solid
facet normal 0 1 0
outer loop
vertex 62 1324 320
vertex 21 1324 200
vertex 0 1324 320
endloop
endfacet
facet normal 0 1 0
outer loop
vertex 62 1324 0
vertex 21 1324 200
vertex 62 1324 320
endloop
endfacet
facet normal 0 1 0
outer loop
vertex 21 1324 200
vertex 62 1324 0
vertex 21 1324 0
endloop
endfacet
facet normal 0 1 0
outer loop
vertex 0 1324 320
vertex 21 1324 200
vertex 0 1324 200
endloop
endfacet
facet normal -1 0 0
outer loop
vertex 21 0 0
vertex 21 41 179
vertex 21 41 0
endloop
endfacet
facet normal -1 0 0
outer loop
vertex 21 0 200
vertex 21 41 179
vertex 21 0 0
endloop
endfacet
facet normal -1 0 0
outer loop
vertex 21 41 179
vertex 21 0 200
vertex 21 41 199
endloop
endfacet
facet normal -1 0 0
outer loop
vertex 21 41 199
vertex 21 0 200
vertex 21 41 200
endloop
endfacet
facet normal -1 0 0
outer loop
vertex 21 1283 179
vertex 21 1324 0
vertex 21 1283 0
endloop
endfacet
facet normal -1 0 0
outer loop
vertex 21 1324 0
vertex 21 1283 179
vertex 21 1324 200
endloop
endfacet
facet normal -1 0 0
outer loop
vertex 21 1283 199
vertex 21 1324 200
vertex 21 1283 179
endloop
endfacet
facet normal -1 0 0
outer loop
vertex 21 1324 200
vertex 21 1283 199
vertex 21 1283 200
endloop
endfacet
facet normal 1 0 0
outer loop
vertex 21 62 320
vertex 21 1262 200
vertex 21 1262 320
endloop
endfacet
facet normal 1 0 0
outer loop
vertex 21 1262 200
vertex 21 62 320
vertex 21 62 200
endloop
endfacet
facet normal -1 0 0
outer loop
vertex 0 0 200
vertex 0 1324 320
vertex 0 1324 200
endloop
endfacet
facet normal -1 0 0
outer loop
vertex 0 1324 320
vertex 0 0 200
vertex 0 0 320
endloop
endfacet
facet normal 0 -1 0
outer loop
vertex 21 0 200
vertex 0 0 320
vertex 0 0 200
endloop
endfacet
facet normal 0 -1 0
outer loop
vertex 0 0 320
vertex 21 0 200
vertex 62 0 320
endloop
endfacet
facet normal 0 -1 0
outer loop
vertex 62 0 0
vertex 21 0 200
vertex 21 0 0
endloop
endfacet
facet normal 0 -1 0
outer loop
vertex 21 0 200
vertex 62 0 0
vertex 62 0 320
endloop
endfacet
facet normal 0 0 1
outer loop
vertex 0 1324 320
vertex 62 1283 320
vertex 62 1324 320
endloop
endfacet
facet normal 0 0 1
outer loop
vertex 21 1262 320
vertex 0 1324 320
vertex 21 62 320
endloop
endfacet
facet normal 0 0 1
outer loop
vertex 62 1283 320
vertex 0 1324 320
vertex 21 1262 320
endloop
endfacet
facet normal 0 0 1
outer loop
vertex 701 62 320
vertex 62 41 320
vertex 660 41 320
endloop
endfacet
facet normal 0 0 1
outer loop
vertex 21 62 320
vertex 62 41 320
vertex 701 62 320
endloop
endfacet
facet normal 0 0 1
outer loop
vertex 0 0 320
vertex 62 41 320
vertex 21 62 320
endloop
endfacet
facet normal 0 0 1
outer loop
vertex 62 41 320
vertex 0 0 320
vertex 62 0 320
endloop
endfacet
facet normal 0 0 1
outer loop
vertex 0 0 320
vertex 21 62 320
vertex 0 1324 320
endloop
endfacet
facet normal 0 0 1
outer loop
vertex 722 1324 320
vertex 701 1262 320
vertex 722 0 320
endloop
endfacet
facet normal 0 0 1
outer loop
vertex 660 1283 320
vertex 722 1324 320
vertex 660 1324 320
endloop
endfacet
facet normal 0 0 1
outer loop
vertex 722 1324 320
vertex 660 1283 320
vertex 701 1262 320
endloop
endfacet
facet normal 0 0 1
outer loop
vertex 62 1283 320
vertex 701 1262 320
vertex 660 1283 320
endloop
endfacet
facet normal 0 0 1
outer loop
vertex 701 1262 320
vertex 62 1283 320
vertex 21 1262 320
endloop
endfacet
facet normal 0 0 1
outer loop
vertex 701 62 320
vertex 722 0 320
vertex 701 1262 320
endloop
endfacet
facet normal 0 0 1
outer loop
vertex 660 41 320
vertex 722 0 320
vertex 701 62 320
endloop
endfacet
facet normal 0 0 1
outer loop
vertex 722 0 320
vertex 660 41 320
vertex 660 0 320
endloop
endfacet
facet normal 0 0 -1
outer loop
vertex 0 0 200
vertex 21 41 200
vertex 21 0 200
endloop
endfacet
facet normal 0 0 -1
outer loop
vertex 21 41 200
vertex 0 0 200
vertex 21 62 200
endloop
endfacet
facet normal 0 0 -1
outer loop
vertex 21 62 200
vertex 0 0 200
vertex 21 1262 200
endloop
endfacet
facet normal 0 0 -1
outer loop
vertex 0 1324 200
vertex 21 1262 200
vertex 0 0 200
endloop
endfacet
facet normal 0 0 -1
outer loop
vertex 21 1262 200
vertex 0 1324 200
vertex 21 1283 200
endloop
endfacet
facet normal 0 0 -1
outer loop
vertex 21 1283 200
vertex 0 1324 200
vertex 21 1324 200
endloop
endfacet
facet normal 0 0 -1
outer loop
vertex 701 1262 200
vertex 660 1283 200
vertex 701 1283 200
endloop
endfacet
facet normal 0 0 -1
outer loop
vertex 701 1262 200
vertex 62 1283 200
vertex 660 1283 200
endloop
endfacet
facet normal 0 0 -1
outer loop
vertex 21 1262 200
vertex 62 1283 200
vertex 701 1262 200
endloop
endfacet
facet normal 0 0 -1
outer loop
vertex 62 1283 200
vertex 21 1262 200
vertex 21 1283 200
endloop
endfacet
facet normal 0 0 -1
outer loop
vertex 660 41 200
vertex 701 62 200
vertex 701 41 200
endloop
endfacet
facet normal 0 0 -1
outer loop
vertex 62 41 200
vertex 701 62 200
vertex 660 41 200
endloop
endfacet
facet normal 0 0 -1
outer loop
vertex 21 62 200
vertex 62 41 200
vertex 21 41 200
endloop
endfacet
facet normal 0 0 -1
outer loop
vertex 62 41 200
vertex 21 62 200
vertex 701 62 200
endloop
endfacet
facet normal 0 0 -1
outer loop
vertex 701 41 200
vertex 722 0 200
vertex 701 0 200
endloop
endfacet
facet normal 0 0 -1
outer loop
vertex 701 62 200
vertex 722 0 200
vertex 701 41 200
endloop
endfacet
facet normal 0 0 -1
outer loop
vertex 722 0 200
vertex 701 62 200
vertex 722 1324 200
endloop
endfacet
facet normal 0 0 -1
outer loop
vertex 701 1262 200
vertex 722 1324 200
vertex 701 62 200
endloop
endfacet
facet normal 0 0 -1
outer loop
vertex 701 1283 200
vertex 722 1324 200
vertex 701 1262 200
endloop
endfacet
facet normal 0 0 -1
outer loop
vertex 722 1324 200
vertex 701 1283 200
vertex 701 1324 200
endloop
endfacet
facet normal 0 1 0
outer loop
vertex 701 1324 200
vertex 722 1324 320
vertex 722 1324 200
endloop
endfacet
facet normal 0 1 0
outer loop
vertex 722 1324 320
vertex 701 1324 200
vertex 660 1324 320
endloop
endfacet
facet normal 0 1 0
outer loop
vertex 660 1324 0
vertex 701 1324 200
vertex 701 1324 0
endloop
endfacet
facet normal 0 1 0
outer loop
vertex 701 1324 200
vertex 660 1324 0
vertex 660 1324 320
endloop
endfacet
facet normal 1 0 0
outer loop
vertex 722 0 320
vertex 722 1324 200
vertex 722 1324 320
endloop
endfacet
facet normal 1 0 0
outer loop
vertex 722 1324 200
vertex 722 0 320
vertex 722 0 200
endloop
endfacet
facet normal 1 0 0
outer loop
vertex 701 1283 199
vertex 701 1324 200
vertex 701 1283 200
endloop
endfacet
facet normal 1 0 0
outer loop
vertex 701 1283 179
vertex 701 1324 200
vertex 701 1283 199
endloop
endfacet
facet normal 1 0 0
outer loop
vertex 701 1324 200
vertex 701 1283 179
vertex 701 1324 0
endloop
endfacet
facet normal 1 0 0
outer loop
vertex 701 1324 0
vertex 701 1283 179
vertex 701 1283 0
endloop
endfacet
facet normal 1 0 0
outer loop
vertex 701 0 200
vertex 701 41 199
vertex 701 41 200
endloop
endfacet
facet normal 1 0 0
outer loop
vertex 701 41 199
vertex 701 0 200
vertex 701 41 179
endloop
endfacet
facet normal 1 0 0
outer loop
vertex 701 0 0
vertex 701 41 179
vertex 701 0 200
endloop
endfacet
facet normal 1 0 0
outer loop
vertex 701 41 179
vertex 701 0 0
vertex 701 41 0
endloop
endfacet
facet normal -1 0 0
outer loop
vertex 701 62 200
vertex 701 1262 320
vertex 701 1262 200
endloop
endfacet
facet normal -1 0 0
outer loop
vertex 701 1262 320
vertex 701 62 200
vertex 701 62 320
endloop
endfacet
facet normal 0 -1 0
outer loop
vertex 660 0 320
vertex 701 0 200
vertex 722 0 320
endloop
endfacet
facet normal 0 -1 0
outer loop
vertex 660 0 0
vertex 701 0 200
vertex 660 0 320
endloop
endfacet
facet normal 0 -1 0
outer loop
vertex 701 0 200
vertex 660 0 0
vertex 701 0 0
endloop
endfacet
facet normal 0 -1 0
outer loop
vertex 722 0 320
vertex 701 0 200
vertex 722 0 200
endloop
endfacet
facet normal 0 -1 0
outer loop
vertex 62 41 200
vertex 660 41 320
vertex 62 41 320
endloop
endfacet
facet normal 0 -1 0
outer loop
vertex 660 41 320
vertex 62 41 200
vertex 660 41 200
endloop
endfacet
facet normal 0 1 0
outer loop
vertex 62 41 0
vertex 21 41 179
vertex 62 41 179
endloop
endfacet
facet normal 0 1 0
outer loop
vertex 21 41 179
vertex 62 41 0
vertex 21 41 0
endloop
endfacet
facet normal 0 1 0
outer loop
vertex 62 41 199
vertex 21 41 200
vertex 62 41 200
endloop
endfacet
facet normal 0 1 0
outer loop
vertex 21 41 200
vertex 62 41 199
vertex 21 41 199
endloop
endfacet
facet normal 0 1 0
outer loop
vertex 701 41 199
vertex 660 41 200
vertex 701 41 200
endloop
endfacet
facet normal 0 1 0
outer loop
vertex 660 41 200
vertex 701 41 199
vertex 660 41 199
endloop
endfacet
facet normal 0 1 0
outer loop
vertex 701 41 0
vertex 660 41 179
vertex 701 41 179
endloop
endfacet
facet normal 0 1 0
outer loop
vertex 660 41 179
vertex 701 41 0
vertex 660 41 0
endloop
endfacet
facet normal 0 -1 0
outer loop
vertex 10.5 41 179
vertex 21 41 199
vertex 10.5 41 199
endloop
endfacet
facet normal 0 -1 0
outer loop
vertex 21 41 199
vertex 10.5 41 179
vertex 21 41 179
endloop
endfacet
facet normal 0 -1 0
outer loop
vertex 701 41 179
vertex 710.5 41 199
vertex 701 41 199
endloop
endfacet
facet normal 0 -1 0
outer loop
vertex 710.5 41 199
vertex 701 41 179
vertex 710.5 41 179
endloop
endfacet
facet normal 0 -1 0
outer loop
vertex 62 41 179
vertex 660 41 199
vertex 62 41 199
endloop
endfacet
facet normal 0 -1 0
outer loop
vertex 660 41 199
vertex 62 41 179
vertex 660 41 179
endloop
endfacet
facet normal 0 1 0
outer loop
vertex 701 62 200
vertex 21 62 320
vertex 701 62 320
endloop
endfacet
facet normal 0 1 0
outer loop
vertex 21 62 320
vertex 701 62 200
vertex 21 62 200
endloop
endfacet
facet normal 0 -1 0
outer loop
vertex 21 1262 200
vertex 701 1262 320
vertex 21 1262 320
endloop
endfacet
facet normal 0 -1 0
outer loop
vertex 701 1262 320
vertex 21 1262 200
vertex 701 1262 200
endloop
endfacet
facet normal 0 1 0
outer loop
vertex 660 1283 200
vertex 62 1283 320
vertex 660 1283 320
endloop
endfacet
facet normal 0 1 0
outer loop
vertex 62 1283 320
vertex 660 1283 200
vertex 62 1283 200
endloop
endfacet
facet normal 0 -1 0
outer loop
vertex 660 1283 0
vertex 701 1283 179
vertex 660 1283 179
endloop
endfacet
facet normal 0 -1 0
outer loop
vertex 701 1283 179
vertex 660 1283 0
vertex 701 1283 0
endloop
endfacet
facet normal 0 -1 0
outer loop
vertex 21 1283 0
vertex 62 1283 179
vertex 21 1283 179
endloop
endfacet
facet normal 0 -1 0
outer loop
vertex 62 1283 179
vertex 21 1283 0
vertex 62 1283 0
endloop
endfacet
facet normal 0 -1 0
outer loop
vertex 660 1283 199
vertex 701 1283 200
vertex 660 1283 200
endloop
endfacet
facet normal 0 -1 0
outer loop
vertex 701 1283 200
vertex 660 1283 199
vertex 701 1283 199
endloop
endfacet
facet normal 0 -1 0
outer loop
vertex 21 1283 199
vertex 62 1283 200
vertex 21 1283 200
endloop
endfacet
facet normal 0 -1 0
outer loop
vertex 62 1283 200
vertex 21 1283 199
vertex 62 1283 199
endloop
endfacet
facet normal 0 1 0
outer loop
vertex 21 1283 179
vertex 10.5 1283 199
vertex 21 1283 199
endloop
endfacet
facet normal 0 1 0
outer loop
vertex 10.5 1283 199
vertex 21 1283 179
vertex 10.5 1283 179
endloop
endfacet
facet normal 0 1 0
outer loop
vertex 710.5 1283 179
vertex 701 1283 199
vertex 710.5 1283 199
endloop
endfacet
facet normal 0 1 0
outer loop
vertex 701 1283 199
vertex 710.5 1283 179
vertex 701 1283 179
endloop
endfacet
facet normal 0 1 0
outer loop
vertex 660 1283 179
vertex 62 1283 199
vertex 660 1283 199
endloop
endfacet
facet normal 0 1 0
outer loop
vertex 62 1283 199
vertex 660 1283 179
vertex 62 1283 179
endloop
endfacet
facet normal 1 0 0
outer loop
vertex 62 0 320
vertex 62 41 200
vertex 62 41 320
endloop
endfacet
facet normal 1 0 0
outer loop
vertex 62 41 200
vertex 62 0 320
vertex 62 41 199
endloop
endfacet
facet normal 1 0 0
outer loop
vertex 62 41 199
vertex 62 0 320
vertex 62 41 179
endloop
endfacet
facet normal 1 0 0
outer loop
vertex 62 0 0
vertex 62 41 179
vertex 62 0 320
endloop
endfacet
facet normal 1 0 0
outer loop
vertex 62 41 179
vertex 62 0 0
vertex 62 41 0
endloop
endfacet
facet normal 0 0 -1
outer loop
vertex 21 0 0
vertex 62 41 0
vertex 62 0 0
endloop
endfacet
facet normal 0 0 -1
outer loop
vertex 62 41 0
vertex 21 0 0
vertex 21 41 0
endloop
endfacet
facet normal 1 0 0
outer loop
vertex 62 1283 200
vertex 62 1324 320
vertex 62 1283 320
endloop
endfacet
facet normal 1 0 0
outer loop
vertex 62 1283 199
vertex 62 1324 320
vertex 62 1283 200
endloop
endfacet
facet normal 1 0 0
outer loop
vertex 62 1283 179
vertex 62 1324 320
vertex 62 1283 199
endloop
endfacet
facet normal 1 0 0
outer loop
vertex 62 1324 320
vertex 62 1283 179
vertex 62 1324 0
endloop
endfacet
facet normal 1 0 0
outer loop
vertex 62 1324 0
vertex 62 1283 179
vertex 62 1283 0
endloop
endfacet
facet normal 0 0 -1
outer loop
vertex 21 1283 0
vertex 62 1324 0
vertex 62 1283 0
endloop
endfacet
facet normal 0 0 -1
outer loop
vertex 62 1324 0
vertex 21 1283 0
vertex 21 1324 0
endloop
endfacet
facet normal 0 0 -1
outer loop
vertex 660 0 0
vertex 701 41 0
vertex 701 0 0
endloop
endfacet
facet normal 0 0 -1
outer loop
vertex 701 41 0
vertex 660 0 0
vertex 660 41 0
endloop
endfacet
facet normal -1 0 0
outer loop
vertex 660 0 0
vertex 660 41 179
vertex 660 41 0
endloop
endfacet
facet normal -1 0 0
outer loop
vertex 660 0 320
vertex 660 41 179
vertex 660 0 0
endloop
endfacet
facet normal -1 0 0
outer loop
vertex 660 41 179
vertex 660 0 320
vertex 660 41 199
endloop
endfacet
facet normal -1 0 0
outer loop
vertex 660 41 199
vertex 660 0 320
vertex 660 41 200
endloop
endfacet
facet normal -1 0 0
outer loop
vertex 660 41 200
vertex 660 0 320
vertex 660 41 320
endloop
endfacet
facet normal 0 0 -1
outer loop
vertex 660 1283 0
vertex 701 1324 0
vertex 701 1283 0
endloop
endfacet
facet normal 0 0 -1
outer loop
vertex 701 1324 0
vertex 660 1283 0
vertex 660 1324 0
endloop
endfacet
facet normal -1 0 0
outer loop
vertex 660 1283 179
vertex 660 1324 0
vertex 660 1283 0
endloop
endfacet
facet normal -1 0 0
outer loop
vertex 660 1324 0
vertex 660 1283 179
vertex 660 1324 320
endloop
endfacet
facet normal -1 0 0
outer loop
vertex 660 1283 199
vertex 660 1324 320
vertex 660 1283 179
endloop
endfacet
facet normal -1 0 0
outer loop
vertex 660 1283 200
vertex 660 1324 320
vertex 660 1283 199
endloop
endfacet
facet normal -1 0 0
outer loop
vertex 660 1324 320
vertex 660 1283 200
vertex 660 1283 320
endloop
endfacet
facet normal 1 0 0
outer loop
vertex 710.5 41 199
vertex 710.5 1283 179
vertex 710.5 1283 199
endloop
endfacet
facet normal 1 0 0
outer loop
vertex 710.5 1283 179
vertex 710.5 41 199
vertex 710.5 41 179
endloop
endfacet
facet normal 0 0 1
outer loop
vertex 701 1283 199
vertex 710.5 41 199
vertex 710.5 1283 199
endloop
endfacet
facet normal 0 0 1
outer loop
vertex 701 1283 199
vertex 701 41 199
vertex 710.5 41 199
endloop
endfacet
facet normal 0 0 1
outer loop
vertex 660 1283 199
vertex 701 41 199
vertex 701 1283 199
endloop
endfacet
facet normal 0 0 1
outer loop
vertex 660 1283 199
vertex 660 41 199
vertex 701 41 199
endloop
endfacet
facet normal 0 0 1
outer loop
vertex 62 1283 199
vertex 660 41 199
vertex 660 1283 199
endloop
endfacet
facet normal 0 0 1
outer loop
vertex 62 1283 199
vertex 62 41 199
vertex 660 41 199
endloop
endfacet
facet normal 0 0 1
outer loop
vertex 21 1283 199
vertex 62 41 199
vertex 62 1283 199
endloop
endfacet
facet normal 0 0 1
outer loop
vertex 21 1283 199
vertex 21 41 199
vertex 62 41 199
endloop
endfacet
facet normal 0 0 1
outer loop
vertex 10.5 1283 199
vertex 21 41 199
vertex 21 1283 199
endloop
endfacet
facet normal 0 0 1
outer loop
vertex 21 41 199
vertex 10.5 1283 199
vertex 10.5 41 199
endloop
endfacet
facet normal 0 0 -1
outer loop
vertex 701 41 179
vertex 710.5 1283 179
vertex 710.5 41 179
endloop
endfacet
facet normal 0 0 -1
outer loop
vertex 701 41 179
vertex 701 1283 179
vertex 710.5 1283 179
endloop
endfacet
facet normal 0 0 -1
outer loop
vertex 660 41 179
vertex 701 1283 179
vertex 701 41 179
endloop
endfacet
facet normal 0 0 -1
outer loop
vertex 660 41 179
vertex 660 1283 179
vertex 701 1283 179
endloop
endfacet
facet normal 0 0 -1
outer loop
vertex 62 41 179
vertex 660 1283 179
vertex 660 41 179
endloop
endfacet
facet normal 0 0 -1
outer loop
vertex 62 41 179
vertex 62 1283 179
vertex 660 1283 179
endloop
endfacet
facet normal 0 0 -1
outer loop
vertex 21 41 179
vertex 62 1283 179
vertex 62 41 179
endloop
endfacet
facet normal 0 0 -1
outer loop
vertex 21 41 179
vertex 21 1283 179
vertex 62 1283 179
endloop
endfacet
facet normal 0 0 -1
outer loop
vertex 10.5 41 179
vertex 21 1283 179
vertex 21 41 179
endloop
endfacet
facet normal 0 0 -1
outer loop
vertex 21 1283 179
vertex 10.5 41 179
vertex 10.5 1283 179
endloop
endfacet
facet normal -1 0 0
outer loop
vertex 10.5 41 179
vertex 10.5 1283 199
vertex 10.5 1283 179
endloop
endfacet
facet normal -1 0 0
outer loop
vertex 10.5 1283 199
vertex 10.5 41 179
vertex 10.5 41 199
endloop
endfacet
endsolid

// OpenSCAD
leg_height=320;
leg_width=41;
playfield_width=680;
playfield_height=1200;
sidewall_height=120;
sidewall_thikness=21;


//Sidewall long 1
translate([0,0,leg_height - sidewall_height]){
    rotate([90,0,90])
    cube([playfield_height + 2*leg_width + 2*sidewall_thikness,sidewall_height, sidewall_thikness],false);
}
//Sidewall long 2
translate([playfield_width+sidewall_thikness,0,leg_height - sidewall_height]){
    rotate([90,0,90])
    cube([playfield_height + 2*leg_width + 2*sidewall_thikness,sidewall_height, sidewall_thikness],false);
}
//Sidewall short 1
translate([sidewall_thikness,leg_width + sidewall_thikness,leg_height - sidewall_height]){
    rotate([90,0,0])
    cube([playfield_width, sidewall_height, sidewall_thikness],false);
}
//Sidewall short 2
translate([sidewall_thikness,playfield_height+leg_width + 2*sidewall_thikness,leg_height - sidewall_height]){
    rotate([90,0,0])
    cube([playfield_width, sidewall_height, sidewall_thikness],false);
}

//Leg 1
translate([sidewall_thikness,0]){
    cube([leg_width,leg_width,leg_height],false);
}
//Leg 2
translate([sidewall_thikness,playfield_height + leg_width + 2*sidewall_thikness]){
    cube([leg_width,leg_width,leg_height],false);
}
//Leg 3
translate([playfield_width - leg_width+sidewall_thikness,0]){
    cube([leg_width,leg_width,leg_height],false);
}
//Leg 4
translate([playfield_width - leg_width+sidewall_thikness,playfield_height + leg_width + 2*sidewall_thikness]){
    cube([leg_width,leg_width,leg_height],false);
}
//Bottom
translate([sidewall_thikness/2,leg_width,leg_height - sidewall_thikness - sidewall_height]){
    color([1,0,0])
    cube([700, playfield_height+2*sidewall_thikness,20],false);
}



//Leg
//translate([-playfield_width/2+leg_timber_width/2,-table_depth/2+leg_timber_width/2,0])
//{
//    leg(leg_length,lap_depth,leg_timber_width,strut_timber_width);
//}

//Leg
//translate([playfield_width/2-leg_timber_width/2,-table_depth/2+leg_timber_width/2,0]){
//    rotate([0,0,90]){
//        leg(leg_length,lap_depth,leg_timber_width,strut_timber_width);
//    }
//}

//Leg
//translate([-playfield_width/2+leg_timber_width/2,table_depth/2-leg_timber_width/2,0]){
//    rotate([0,0,-90]){
//        leg(leg_length,lap_depth,leg_timber_width,strut_timber_width);
//    }
//}

//Leg
//translate([playfield_width/2-leg_timber_width/2,table_depth/2-leg_timber_width/2,0]){
//    rotate([0,0,180]){
//        leg(leg_length,lap_depth,leg_timber_width,strut_timber_width);
//    }
//}
